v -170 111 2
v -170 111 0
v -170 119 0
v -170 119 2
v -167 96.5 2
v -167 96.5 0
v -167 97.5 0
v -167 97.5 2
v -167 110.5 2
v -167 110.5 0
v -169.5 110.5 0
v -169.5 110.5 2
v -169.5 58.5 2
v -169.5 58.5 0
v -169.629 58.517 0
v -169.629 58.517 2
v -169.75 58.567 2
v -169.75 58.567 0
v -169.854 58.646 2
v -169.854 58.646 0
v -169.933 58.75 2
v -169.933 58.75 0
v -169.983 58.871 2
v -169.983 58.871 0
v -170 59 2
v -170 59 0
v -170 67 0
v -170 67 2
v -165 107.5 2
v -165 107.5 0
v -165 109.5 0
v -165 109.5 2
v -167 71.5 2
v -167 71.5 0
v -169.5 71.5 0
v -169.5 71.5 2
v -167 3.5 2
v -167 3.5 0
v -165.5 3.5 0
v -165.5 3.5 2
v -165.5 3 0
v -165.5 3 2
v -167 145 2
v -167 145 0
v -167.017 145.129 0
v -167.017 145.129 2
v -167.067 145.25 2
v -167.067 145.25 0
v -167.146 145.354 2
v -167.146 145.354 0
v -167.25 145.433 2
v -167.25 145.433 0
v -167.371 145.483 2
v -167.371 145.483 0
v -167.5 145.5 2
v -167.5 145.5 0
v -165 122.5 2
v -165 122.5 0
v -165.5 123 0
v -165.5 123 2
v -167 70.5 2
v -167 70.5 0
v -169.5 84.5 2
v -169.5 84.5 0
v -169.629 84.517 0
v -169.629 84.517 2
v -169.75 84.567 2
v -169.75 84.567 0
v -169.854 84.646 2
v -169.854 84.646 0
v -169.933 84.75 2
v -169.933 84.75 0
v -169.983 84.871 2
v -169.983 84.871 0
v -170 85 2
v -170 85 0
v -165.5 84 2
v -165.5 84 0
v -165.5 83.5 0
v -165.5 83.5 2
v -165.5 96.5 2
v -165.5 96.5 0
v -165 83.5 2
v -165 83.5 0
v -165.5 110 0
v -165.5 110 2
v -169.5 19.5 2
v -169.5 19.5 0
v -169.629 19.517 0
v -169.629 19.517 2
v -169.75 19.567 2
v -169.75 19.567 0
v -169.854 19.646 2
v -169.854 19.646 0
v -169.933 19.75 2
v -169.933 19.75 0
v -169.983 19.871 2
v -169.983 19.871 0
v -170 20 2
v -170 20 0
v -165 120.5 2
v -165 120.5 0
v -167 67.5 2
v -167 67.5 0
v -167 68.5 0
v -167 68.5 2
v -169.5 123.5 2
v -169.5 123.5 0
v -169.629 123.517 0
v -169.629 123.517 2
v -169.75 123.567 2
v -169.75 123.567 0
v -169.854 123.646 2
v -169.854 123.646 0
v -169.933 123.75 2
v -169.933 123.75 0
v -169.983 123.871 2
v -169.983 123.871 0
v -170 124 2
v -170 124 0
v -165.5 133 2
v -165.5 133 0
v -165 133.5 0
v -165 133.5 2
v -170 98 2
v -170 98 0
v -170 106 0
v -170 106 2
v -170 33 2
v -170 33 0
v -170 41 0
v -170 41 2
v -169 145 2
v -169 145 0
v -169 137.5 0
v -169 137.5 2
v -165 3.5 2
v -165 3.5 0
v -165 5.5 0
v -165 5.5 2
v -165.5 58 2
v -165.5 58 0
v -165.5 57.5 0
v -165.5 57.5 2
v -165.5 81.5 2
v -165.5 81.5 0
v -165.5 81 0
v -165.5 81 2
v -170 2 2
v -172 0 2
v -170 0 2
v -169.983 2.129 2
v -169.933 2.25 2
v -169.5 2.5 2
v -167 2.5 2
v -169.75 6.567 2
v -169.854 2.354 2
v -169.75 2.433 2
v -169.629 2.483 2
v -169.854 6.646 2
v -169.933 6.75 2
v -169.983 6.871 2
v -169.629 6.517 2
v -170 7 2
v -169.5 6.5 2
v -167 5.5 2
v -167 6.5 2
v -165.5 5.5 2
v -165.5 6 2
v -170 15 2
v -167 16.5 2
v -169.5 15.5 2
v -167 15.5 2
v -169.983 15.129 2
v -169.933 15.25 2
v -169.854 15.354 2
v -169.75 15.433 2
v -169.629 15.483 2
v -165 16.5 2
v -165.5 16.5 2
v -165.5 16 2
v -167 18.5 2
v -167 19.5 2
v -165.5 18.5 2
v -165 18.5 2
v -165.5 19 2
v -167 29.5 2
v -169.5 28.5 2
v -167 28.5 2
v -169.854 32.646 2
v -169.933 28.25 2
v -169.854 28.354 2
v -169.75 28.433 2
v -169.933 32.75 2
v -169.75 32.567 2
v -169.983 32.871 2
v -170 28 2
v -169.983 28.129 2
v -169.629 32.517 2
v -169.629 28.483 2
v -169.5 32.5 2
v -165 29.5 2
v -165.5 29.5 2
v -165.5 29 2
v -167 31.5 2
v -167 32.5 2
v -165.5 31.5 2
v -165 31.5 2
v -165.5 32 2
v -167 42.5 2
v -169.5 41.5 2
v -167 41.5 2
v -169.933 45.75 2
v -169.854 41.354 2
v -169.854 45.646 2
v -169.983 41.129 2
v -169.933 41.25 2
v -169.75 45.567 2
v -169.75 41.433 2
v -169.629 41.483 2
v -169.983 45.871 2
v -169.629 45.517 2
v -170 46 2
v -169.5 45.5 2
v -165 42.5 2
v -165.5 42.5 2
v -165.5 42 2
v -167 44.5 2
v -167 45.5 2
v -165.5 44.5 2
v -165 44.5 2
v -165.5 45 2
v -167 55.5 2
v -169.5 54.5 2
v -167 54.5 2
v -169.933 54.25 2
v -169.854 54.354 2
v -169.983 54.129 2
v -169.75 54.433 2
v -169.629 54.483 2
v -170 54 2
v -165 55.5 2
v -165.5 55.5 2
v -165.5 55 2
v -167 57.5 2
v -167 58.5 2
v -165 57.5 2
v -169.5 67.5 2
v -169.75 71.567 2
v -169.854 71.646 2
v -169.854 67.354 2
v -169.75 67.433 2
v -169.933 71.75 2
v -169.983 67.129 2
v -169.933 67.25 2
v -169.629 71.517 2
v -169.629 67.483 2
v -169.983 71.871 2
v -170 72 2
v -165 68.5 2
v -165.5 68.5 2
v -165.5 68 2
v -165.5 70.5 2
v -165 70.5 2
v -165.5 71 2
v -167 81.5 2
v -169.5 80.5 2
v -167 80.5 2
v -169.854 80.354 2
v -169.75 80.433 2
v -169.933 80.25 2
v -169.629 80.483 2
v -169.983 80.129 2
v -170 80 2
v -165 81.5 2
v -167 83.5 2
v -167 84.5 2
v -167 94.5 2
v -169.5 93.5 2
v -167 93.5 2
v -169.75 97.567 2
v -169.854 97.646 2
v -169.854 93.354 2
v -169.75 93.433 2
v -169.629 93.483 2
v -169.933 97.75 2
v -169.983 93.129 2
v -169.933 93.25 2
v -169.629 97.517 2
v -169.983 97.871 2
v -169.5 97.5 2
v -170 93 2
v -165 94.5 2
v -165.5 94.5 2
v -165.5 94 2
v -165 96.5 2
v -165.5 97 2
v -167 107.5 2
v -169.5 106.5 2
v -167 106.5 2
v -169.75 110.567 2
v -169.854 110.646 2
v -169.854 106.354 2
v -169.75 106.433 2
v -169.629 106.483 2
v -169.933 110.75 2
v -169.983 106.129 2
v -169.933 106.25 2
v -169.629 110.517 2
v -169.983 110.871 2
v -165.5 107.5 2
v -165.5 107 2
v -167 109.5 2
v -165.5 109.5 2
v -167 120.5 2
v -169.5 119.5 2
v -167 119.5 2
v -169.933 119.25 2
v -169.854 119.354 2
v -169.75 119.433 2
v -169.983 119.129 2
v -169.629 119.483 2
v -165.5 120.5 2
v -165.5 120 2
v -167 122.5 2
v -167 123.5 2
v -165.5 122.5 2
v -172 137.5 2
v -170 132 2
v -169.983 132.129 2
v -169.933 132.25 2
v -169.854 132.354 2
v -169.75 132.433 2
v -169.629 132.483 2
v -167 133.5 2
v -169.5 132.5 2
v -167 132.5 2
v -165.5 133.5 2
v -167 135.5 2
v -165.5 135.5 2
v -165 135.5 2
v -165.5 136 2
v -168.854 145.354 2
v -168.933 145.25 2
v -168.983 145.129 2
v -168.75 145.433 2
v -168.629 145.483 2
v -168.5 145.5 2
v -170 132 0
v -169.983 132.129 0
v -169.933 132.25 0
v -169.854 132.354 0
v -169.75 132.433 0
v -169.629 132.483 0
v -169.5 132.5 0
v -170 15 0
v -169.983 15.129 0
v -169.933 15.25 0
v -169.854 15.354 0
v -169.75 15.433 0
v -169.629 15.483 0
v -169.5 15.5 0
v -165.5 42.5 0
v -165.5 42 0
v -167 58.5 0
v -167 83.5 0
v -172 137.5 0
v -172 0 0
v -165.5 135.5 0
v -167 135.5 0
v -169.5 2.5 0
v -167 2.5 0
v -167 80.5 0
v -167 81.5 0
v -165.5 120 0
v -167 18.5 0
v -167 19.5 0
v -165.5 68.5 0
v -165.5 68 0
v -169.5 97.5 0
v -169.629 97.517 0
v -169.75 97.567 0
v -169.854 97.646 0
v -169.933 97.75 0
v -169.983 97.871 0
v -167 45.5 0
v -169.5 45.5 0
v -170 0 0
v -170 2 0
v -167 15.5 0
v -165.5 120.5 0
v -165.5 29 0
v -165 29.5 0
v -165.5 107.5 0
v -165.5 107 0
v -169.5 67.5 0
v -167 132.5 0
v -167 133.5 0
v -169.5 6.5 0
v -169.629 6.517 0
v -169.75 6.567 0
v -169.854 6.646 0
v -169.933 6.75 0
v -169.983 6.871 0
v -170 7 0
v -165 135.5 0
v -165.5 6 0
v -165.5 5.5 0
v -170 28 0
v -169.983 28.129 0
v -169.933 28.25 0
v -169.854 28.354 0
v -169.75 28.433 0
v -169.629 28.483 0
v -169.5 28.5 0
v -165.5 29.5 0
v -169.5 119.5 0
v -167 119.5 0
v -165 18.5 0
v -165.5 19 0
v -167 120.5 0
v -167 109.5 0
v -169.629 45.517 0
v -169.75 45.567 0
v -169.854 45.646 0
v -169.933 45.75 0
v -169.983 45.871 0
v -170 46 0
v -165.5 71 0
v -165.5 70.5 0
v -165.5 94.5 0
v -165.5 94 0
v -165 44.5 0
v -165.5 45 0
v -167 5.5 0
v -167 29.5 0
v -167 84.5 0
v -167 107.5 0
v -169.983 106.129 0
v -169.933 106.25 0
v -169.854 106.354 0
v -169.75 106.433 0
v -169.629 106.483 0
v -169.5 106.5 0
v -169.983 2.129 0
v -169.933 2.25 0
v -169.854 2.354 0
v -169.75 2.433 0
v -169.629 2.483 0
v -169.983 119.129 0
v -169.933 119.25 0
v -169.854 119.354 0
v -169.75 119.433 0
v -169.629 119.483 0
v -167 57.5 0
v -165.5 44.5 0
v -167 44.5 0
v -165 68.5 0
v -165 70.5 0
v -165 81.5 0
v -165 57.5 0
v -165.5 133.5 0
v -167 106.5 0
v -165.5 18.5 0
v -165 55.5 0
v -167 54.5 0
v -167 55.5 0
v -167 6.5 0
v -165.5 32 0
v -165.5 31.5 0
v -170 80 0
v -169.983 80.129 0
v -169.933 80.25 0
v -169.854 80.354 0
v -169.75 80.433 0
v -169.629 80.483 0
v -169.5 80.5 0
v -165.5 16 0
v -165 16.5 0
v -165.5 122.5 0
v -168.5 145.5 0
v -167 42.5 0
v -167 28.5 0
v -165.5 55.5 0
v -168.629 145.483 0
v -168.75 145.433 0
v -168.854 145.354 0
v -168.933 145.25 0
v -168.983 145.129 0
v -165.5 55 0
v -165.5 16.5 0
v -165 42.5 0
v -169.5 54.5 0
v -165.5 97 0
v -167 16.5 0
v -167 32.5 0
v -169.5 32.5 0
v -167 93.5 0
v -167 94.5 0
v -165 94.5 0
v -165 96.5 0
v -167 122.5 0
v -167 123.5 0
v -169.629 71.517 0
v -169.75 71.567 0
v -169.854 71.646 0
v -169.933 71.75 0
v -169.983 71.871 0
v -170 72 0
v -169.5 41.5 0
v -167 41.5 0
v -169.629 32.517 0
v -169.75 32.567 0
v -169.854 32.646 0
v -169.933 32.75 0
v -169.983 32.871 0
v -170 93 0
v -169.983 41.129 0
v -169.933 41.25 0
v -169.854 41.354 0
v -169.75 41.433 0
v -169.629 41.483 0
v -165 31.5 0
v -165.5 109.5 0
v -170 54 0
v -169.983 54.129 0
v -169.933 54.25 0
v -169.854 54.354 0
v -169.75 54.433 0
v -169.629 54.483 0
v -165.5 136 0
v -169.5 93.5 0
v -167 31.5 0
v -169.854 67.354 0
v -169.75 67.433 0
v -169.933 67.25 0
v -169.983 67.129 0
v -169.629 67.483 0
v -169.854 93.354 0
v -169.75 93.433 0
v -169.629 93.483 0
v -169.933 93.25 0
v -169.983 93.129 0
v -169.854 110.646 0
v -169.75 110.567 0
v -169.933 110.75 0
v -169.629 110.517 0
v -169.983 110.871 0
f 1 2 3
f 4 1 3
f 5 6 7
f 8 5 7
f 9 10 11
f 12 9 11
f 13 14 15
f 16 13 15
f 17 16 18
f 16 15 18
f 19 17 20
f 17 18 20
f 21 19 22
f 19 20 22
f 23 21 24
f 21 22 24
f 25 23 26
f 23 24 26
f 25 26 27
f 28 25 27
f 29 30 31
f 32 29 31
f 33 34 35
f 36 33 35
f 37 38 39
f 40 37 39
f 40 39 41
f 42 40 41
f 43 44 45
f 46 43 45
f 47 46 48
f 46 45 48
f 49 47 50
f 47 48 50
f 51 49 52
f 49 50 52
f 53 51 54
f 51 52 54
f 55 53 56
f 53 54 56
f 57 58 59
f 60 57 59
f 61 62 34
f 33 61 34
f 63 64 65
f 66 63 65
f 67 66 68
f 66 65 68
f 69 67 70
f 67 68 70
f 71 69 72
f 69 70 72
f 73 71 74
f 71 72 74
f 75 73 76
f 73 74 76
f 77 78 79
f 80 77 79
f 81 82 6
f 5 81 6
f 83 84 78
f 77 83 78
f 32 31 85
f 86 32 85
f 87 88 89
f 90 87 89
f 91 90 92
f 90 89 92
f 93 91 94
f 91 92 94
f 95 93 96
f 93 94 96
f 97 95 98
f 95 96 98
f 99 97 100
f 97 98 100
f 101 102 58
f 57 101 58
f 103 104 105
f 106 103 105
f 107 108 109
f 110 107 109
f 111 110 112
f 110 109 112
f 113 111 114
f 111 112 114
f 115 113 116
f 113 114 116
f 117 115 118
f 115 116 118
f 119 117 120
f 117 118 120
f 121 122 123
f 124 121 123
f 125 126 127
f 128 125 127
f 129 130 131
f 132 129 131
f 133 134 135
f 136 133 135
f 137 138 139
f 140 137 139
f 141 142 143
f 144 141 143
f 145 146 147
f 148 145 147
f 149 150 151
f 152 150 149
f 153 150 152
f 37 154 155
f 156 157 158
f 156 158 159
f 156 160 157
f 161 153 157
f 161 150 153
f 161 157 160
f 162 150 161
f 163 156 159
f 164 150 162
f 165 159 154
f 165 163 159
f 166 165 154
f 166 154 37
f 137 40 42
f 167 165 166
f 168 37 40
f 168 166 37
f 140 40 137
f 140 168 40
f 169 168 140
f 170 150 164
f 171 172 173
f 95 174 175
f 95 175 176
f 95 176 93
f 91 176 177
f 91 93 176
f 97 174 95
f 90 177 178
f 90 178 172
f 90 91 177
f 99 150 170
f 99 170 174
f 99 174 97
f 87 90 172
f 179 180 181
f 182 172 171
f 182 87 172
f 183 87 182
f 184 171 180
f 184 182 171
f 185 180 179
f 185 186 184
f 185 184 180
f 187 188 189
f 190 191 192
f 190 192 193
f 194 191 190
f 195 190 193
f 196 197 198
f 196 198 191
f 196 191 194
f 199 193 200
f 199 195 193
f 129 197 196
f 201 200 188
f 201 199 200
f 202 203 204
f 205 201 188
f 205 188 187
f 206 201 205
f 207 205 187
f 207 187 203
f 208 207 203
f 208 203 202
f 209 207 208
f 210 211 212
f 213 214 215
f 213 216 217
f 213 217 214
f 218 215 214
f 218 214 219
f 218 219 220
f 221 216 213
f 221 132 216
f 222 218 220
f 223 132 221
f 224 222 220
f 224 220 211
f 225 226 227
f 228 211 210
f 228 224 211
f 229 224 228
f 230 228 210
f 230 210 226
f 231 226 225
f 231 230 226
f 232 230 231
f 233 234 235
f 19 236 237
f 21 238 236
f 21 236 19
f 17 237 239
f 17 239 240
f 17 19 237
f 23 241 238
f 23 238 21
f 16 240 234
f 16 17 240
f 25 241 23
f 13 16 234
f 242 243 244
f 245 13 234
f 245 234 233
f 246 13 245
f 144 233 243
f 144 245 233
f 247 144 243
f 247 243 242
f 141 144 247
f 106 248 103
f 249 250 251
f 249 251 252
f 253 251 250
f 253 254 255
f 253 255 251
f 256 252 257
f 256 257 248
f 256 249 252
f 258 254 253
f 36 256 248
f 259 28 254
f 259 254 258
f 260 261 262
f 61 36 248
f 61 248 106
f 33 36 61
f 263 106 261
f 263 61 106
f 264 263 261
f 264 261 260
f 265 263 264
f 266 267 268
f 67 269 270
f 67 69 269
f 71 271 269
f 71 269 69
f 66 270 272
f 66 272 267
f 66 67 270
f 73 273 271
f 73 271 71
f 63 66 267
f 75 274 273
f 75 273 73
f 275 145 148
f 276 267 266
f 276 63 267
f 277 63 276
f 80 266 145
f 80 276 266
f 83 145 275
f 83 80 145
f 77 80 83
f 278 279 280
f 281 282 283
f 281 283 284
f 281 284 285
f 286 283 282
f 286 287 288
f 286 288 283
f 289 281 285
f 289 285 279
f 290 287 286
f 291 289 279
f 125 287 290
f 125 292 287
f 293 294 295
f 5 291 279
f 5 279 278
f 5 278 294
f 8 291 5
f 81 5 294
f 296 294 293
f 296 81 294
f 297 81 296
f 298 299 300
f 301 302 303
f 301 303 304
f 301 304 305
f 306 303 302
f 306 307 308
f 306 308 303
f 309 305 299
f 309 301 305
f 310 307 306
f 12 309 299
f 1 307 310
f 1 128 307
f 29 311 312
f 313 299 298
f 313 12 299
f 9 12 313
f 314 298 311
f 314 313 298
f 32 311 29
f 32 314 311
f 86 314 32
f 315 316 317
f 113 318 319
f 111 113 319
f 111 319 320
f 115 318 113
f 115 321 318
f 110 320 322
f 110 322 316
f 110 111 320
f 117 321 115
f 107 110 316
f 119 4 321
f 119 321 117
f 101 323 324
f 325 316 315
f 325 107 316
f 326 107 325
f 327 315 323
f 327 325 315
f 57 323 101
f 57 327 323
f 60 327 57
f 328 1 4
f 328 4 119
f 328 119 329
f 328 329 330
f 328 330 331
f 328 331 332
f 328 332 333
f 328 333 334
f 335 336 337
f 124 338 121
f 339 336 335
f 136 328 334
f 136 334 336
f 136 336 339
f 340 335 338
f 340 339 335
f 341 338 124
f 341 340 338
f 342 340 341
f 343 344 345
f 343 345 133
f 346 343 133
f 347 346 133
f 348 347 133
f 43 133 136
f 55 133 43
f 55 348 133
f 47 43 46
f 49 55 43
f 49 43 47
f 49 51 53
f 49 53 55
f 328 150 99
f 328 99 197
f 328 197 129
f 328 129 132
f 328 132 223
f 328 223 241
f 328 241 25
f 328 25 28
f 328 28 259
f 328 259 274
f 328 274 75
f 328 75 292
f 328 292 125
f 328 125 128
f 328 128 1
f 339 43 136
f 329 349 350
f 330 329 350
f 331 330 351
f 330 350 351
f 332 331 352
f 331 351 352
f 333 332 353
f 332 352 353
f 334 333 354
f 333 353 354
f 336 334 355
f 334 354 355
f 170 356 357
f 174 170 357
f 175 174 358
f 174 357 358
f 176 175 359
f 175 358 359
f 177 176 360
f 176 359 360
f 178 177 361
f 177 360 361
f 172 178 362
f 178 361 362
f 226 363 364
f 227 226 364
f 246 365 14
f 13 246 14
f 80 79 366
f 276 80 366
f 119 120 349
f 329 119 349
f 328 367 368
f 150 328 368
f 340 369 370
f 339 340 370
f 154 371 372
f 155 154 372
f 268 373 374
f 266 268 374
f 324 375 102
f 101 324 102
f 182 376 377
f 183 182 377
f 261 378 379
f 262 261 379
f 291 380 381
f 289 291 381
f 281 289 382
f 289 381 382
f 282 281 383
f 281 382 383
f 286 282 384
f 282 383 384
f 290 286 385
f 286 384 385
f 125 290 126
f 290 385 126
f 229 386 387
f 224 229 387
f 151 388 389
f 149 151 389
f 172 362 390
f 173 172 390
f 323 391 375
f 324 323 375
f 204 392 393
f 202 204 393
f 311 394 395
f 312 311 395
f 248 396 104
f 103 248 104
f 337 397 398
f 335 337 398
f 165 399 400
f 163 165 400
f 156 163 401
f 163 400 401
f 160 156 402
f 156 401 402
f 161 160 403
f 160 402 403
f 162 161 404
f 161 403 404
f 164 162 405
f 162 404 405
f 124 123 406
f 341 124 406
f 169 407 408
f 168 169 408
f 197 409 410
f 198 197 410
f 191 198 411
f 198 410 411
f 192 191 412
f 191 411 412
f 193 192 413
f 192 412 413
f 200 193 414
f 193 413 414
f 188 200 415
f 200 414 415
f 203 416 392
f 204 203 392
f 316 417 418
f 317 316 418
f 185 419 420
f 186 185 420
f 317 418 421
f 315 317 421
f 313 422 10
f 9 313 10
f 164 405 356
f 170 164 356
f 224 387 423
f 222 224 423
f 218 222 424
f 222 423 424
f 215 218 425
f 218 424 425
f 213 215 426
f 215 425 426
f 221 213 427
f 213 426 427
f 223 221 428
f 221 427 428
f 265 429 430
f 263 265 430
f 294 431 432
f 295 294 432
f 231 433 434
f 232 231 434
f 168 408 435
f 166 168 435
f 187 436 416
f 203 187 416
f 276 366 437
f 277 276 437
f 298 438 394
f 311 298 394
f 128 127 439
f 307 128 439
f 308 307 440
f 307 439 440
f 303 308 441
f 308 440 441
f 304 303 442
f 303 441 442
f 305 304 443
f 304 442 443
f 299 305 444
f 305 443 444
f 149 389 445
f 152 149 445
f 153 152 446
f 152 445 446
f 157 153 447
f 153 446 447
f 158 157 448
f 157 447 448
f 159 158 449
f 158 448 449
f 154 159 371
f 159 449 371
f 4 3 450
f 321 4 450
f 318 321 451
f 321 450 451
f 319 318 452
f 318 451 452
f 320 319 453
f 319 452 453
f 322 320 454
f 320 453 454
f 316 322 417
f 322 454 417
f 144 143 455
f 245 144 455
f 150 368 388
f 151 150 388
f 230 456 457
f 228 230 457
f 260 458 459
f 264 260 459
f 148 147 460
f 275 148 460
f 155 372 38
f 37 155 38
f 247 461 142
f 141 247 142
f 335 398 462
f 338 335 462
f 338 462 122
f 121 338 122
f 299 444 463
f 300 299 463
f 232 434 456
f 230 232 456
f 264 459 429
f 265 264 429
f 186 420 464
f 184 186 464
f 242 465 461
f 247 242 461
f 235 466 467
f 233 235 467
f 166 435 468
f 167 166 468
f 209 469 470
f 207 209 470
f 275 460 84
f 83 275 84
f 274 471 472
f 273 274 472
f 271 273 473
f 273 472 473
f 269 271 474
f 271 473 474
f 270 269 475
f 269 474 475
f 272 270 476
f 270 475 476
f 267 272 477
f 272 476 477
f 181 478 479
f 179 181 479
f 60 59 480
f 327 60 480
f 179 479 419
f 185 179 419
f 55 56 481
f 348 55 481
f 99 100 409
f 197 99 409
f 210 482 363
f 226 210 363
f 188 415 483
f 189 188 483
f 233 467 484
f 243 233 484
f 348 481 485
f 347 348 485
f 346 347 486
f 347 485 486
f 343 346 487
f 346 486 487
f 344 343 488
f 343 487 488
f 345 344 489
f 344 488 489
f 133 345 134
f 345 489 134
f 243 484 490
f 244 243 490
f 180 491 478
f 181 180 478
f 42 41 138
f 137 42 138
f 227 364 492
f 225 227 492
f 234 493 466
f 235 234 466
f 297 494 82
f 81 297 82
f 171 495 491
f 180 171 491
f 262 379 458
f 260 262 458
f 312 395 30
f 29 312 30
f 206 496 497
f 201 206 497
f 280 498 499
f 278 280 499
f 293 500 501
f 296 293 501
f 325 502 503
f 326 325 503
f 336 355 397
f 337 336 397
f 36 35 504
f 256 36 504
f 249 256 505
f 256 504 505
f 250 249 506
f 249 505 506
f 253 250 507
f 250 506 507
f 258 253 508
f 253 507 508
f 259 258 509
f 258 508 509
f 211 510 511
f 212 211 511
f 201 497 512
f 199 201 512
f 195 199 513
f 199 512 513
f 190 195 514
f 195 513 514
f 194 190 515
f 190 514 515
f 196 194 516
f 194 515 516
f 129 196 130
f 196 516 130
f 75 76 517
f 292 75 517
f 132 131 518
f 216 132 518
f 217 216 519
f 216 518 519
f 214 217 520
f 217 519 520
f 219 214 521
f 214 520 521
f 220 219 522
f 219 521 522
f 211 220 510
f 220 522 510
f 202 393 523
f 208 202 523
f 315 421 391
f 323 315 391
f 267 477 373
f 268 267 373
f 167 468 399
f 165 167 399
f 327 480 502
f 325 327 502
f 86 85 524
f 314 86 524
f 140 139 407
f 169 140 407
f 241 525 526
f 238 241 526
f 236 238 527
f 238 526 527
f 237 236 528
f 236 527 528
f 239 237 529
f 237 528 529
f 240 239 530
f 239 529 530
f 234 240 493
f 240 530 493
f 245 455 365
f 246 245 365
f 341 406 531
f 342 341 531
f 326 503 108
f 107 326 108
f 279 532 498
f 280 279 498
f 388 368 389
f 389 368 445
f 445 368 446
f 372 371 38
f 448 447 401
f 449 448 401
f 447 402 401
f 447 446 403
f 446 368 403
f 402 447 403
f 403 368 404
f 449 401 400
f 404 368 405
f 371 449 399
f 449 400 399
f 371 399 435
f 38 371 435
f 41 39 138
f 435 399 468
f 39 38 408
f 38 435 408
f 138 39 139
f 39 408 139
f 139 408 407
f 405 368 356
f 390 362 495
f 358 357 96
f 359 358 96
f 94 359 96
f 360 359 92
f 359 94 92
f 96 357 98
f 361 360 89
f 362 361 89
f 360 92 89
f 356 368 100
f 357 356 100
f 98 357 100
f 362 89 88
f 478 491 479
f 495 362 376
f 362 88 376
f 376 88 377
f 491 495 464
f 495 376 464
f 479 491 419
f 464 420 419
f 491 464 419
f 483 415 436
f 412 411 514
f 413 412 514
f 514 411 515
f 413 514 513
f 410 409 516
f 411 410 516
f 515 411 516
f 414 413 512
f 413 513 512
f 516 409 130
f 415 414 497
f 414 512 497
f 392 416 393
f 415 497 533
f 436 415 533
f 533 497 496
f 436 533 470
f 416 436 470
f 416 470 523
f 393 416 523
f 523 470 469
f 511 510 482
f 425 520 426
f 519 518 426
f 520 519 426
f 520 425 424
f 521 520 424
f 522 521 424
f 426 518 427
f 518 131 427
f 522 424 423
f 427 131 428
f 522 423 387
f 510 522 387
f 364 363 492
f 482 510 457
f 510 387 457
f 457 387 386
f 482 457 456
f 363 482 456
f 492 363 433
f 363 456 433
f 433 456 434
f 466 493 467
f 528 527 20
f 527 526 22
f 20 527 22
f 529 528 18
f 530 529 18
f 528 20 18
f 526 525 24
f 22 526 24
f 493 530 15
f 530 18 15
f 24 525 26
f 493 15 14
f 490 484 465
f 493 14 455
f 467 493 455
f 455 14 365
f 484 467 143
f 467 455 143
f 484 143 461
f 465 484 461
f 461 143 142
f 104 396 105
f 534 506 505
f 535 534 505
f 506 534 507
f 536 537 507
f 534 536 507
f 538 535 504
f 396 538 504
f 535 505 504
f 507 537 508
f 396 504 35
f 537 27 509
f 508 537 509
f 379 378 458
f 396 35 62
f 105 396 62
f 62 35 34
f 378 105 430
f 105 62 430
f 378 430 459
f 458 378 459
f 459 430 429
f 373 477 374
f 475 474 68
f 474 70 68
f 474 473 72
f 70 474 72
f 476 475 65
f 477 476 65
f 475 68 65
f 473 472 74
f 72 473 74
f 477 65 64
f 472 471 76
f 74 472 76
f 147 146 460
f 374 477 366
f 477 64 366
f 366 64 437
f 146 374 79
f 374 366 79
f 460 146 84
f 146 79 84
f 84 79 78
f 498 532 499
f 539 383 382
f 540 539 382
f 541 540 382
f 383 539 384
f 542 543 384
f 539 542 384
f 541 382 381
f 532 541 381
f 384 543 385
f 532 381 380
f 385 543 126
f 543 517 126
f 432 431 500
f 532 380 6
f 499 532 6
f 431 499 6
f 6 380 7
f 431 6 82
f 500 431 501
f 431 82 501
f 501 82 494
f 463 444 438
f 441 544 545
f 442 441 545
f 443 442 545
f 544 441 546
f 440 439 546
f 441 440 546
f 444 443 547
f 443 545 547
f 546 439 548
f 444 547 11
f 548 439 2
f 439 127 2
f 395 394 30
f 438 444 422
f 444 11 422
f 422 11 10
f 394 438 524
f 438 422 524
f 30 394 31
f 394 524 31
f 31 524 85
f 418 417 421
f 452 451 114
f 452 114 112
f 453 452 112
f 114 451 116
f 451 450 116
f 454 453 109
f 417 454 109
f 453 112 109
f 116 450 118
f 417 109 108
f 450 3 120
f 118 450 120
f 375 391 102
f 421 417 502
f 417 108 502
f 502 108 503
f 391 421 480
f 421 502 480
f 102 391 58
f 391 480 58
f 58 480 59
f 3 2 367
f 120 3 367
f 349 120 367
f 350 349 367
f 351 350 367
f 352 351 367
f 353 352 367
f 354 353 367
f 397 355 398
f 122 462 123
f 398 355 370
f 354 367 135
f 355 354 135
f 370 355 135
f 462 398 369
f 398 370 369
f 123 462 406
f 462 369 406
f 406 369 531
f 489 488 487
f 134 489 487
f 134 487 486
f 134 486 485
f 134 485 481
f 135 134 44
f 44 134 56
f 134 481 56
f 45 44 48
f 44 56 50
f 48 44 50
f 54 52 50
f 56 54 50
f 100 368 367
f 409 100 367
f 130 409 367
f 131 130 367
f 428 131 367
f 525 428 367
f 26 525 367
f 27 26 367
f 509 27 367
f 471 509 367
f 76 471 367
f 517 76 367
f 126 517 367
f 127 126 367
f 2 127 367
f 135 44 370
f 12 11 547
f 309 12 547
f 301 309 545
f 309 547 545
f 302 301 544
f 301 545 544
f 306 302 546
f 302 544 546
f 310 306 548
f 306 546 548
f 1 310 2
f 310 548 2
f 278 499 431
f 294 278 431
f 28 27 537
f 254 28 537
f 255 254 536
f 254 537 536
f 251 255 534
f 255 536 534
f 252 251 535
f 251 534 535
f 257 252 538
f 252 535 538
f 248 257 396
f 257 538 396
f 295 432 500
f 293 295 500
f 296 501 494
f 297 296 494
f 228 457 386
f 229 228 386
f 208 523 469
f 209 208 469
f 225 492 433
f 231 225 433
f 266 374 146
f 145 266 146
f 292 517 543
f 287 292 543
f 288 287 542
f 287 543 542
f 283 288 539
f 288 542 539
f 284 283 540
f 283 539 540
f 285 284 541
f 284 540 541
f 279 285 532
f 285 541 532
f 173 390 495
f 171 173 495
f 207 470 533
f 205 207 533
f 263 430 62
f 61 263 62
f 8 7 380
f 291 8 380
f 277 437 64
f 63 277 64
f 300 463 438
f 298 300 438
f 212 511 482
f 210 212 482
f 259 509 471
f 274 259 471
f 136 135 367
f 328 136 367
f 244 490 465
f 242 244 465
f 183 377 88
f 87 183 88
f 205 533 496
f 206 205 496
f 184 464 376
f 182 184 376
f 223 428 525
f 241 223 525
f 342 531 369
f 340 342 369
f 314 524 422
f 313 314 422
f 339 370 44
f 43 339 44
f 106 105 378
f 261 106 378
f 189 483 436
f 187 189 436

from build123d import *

# Parameters (mm, degrees)
F1_DEPTH = 2


with BuildPart() as f1:
    # F0 (on Top) → F1 (new body)
    with BuildSketch(Plane.XY):
        with BuildLine():
            Line((-167, 135.5), (-167, 137.5))
            Line((-167, 137.5), (-169, 137.5))
            Line((-169, 137.5), (-172, 137.5))
            Line((-172, 137.5), (-172, 0))
            Line((-172, 0), (-170, 0))
            Line((-170, 0), (-170, 2))
            ThreePointArc((-170, 2), (-169.853553, 2.353553), (-169.5, 2.5))
            Line((-169.5, 2.5), (-167, 2.5))
            Line((-167, 2.5), (-167, 3.5))
            Line((-167, 3.5), (-167, 5.5))
            Line((-167, 5.5), (-167, 6.5))
            Line((-167, 6.5), (-169.5, 6.5))
            ThreePointArc((-169.5, 6.5), (-169.853553, 6.646447), (-170, 7))
            Line((-170, 7), (-170, 15))
            ThreePointArc((-170, 15), (-169.853553, 15.353553), (-169.5, 15.5))
            Line((-169.5, 15.5), (-167, 15.5))
            Line((-167, 15.5), (-167, 16.5))
            Line((-167, 16.5), (-167, 18.5))
            Line((-167, 18.5), (-167, 19.5))
            Line((-167, 19.5), (-169.5, 19.5))
            ThreePointArc((-169.5, 19.5), (-169.853553, 19.646447), (-170, 20))
            Line((-170, 20), (-170, 28))
            ThreePointArc((-170, 28), (-169.853553, 28.353553), (-169.5, 28.5))
            Line((-169.5, 28.5), (-167, 28.5))
            Line((-167, 28.5), (-167, 29.5))
            Line((-167, 29.5), (-167, 31.5))
            Line((-167, 31.5), (-167, 32.5))
            Line((-167, 32.5), (-169.5, 32.5))
            ThreePointArc((-169.5, 32.5), (-169.853553, 32.646447), (-170, 33))
            Line((-170, 33), (-170, 41))
            ThreePointArc((-170, 41), (-169.853553, 41.353553), (-169.5, 41.5))
            Line((-169.5, 41.5), (-167, 41.5))
            Line((-167, 41.5), (-167, 42.5))
            Line((-167, 42.5), (-167, 44.5))
            Line((-167, 44.5), (-167, 45.5))
            Line((-167, 45.5), (-169.5, 45.5))
            ThreePointArc((-169.5, 45.5), (-169.853553, 45.646447), (-170, 46))
            Line((-170, 46), (-170, 54))
            ThreePointArc((-170, 54), (-169.853553, 54.353553), (-169.5, 54.5))
            Line((-169.5, 54.5), (-167, 54.5))
            Line((-167, 54.5), (-167, 55.5))
            Line((-167, 55.5), (-167, 57.5))
            Line((-167, 57.5), (-167, 58.5))
            Line((-167, 58.5), (-169.5, 58.5))
            ThreePointArc((-169.5, 58.5), (-169.853553, 58.646447), (-170, 59))
            Line((-170, 59), (-170, 67))
            ThreePointArc((-170, 67), (-169.853553, 67.353553), (-169.5, 67.5))
            Line((-169.5, 67.5), (-167, 67.5))
            Line((-167, 67.5), (-167, 68.5))
            Line((-167, 68.5), (-167, 70.5))
            Line((-167, 70.5), (-167, 71.5))
            Line((-167, 71.5), (-169.5, 71.5))
            ThreePointArc((-169.5, 71.5), (-169.853553, 71.646447), (-170, 72))
            Line((-170, 72), (-170, 80))
            ThreePointArc((-170, 80), (-169.853553, 80.353553), (-169.5, 80.5))
            Line((-169.5, 80.5), (-167, 80.5))
            Line((-167, 80.5), (-167, 81.5))
            Line((-167, 81.5), (-167, 83.5))
            Line((-167, 83.5), (-167, 84.5))
            Line((-167, 84.5), (-169.5, 84.5))
            ThreePointArc((-169.5, 84.5), (-169.853553, 84.646447), (-170, 85))
            Line((-170, 85), (-170, 93))
            ThreePointArc((-170, 93), (-169.853553, 93.353553), (-169.5, 93.5))
            Line((-169.5, 93.5), (-167, 93.5))
            Line((-167, 93.5), (-167, 94.5))
            Line((-167, 94.5), (-167, 96.5))
            Line((-167, 96.5), (-167, 97.5))
            Line((-167, 97.5), (-169.5, 97.5))
            ThreePointArc((-169.5, 97.5), (-169.853553, 97.646447), (-170, 98))
            Line((-170, 98), (-170, 106))
            ThreePointArc((-170, 106), (-169.853553, 106.353553), (-169.5, 106.5))
            Line((-169.5, 106.5), (-167, 106.5))
            Line((-167, 106.5), (-167, 107.5))
            Line((-167, 107.5), (-167, 109.5))
            Line((-167, 109.5), (-167, 110.5))
            Line((-167, 110.5), (-169.5, 110.5))
            ThreePointArc((-169.5, 110.5), (-169.853553, 110.646447), (-170, 111))
            Line((-170, 111), (-170, 119))
            ThreePointArc((-170, 119), (-169.853553, 119.353553), (-169.5, 119.5))
            Line((-169.5, 119.5), (-167, 119.5))
            Line((-167, 119.5), (-167, 120.5))
            Line((-167, 120.5), (-167, 122.5))
            Line((-167, 122.5), (-167, 123.5))
            Line((-167, 123.5), (-169.5, 123.5))
            ThreePointArc((-169.5, 123.5), (-169.853553, 123.646447), (-170, 124))
            Line((-170, 124), (-170, 132))
            ThreePointArc((-170, 132), (-169.853553, 132.353553), (-169.5, 132.5))
            Line((-169.5, 132.5), (-167, 132.5))
            Line((-167, 132.5), (-167, 133.5))
            Line((-167, 133.5), (-167, 135.5))
        make_face()
        Polygon((-167, 5.5), (-167, 3.5), (-165.5, 3.5), (-165.5, 3), (-165, 3.5), (-165, 5.5), (-165.5, 6), (-165.5, 5.5), align=None)
        Polygon((-167, 18.5), (-167, 16.5), (-165.5, 16.5), (-165.5, 16), (-165, 16.5), (-165, 18.5), (-165.5, 19), (-165.5, 18.5), align=None)
        Polygon((-167, 31.5), (-167, 29.5), (-165.5, 29.5), (-165.5, 29), (-165, 29.5), (-165, 31.5), (-165.5, 32), (-165.5, 31.5), align=None)
        Polygon((-167, 44.5), (-167, 42.5), (-165.5, 42.5), (-165.5, 42), (-165, 42.5), (-165, 44.5), (-165.5, 45), (-165.5, 44.5), align=None)
        Polygon((-167, 57.5), (-167, 55.5), (-165.5, 55.5), (-165.5, 55), (-165, 55.5), (-165, 57.5), (-165.5, 58), (-165.5, 57.5), align=None)
        Polygon((-165.5, 70.5), (-167, 70.5), (-167, 68.5), (-165.5, 68.5), (-165.5, 68), (-165, 68.5), (-165, 70.5), (-165.5, 71), align=None)
        Polygon((-165.5, 83.5), (-167, 83.5), (-167, 81.5), (-165.5, 81.5), (-165.5, 81), (-165, 81.5), (-165, 83.5), (-165.5, 84), align=None)
        Polygon((-165.5, 96.5), (-167, 96.5), (-167, 94.5), (-165.5, 94.5), (-165.5, 94), (-165, 94.5), (-165, 96.5), (-165.5, 97), align=None)
        Polygon((-165.5, 109.5), (-167, 109.5), (-167, 107.5), (-165.5, 107.5), (-165.5, 107), (-165, 107.5), (-165, 109.5), (-165.5, 110), align=None)
        Polygon((-165.5, 122.5), (-167, 122.5), (-167, 120.5), (-165.5, 120.5), (-165.5, 120), (-165, 120.5), (-165, 122.5), (-165.5, 123), align=None)
        Polygon((-165.5, 135.5), (-167, 135.5), (-167, 133.5), (-165.5, 133.5), (-165.5, 133), (-165, 133.5), (-165, 135.5), (-165.5, 136), align=None)
        with BuildLine():
            Line((-169, 137.5), (-167, 137.5))
            Line((-167, 137.5), (-167, 145))
            ThreePointArc((-167, 145), (-167.146447, 145.353553), (-167.5, 145.5))
            Line((-167.5, 145.5), (-168.5, 145.5))
            ThreePointArc((-168.5, 145.5), (-168.853553, 145.353553), (-169, 145))
            Line((-169, 145), (-169, 137.5))
        make_face()
    extrude(amount=F1_DEPTH)


solid = f1.part
